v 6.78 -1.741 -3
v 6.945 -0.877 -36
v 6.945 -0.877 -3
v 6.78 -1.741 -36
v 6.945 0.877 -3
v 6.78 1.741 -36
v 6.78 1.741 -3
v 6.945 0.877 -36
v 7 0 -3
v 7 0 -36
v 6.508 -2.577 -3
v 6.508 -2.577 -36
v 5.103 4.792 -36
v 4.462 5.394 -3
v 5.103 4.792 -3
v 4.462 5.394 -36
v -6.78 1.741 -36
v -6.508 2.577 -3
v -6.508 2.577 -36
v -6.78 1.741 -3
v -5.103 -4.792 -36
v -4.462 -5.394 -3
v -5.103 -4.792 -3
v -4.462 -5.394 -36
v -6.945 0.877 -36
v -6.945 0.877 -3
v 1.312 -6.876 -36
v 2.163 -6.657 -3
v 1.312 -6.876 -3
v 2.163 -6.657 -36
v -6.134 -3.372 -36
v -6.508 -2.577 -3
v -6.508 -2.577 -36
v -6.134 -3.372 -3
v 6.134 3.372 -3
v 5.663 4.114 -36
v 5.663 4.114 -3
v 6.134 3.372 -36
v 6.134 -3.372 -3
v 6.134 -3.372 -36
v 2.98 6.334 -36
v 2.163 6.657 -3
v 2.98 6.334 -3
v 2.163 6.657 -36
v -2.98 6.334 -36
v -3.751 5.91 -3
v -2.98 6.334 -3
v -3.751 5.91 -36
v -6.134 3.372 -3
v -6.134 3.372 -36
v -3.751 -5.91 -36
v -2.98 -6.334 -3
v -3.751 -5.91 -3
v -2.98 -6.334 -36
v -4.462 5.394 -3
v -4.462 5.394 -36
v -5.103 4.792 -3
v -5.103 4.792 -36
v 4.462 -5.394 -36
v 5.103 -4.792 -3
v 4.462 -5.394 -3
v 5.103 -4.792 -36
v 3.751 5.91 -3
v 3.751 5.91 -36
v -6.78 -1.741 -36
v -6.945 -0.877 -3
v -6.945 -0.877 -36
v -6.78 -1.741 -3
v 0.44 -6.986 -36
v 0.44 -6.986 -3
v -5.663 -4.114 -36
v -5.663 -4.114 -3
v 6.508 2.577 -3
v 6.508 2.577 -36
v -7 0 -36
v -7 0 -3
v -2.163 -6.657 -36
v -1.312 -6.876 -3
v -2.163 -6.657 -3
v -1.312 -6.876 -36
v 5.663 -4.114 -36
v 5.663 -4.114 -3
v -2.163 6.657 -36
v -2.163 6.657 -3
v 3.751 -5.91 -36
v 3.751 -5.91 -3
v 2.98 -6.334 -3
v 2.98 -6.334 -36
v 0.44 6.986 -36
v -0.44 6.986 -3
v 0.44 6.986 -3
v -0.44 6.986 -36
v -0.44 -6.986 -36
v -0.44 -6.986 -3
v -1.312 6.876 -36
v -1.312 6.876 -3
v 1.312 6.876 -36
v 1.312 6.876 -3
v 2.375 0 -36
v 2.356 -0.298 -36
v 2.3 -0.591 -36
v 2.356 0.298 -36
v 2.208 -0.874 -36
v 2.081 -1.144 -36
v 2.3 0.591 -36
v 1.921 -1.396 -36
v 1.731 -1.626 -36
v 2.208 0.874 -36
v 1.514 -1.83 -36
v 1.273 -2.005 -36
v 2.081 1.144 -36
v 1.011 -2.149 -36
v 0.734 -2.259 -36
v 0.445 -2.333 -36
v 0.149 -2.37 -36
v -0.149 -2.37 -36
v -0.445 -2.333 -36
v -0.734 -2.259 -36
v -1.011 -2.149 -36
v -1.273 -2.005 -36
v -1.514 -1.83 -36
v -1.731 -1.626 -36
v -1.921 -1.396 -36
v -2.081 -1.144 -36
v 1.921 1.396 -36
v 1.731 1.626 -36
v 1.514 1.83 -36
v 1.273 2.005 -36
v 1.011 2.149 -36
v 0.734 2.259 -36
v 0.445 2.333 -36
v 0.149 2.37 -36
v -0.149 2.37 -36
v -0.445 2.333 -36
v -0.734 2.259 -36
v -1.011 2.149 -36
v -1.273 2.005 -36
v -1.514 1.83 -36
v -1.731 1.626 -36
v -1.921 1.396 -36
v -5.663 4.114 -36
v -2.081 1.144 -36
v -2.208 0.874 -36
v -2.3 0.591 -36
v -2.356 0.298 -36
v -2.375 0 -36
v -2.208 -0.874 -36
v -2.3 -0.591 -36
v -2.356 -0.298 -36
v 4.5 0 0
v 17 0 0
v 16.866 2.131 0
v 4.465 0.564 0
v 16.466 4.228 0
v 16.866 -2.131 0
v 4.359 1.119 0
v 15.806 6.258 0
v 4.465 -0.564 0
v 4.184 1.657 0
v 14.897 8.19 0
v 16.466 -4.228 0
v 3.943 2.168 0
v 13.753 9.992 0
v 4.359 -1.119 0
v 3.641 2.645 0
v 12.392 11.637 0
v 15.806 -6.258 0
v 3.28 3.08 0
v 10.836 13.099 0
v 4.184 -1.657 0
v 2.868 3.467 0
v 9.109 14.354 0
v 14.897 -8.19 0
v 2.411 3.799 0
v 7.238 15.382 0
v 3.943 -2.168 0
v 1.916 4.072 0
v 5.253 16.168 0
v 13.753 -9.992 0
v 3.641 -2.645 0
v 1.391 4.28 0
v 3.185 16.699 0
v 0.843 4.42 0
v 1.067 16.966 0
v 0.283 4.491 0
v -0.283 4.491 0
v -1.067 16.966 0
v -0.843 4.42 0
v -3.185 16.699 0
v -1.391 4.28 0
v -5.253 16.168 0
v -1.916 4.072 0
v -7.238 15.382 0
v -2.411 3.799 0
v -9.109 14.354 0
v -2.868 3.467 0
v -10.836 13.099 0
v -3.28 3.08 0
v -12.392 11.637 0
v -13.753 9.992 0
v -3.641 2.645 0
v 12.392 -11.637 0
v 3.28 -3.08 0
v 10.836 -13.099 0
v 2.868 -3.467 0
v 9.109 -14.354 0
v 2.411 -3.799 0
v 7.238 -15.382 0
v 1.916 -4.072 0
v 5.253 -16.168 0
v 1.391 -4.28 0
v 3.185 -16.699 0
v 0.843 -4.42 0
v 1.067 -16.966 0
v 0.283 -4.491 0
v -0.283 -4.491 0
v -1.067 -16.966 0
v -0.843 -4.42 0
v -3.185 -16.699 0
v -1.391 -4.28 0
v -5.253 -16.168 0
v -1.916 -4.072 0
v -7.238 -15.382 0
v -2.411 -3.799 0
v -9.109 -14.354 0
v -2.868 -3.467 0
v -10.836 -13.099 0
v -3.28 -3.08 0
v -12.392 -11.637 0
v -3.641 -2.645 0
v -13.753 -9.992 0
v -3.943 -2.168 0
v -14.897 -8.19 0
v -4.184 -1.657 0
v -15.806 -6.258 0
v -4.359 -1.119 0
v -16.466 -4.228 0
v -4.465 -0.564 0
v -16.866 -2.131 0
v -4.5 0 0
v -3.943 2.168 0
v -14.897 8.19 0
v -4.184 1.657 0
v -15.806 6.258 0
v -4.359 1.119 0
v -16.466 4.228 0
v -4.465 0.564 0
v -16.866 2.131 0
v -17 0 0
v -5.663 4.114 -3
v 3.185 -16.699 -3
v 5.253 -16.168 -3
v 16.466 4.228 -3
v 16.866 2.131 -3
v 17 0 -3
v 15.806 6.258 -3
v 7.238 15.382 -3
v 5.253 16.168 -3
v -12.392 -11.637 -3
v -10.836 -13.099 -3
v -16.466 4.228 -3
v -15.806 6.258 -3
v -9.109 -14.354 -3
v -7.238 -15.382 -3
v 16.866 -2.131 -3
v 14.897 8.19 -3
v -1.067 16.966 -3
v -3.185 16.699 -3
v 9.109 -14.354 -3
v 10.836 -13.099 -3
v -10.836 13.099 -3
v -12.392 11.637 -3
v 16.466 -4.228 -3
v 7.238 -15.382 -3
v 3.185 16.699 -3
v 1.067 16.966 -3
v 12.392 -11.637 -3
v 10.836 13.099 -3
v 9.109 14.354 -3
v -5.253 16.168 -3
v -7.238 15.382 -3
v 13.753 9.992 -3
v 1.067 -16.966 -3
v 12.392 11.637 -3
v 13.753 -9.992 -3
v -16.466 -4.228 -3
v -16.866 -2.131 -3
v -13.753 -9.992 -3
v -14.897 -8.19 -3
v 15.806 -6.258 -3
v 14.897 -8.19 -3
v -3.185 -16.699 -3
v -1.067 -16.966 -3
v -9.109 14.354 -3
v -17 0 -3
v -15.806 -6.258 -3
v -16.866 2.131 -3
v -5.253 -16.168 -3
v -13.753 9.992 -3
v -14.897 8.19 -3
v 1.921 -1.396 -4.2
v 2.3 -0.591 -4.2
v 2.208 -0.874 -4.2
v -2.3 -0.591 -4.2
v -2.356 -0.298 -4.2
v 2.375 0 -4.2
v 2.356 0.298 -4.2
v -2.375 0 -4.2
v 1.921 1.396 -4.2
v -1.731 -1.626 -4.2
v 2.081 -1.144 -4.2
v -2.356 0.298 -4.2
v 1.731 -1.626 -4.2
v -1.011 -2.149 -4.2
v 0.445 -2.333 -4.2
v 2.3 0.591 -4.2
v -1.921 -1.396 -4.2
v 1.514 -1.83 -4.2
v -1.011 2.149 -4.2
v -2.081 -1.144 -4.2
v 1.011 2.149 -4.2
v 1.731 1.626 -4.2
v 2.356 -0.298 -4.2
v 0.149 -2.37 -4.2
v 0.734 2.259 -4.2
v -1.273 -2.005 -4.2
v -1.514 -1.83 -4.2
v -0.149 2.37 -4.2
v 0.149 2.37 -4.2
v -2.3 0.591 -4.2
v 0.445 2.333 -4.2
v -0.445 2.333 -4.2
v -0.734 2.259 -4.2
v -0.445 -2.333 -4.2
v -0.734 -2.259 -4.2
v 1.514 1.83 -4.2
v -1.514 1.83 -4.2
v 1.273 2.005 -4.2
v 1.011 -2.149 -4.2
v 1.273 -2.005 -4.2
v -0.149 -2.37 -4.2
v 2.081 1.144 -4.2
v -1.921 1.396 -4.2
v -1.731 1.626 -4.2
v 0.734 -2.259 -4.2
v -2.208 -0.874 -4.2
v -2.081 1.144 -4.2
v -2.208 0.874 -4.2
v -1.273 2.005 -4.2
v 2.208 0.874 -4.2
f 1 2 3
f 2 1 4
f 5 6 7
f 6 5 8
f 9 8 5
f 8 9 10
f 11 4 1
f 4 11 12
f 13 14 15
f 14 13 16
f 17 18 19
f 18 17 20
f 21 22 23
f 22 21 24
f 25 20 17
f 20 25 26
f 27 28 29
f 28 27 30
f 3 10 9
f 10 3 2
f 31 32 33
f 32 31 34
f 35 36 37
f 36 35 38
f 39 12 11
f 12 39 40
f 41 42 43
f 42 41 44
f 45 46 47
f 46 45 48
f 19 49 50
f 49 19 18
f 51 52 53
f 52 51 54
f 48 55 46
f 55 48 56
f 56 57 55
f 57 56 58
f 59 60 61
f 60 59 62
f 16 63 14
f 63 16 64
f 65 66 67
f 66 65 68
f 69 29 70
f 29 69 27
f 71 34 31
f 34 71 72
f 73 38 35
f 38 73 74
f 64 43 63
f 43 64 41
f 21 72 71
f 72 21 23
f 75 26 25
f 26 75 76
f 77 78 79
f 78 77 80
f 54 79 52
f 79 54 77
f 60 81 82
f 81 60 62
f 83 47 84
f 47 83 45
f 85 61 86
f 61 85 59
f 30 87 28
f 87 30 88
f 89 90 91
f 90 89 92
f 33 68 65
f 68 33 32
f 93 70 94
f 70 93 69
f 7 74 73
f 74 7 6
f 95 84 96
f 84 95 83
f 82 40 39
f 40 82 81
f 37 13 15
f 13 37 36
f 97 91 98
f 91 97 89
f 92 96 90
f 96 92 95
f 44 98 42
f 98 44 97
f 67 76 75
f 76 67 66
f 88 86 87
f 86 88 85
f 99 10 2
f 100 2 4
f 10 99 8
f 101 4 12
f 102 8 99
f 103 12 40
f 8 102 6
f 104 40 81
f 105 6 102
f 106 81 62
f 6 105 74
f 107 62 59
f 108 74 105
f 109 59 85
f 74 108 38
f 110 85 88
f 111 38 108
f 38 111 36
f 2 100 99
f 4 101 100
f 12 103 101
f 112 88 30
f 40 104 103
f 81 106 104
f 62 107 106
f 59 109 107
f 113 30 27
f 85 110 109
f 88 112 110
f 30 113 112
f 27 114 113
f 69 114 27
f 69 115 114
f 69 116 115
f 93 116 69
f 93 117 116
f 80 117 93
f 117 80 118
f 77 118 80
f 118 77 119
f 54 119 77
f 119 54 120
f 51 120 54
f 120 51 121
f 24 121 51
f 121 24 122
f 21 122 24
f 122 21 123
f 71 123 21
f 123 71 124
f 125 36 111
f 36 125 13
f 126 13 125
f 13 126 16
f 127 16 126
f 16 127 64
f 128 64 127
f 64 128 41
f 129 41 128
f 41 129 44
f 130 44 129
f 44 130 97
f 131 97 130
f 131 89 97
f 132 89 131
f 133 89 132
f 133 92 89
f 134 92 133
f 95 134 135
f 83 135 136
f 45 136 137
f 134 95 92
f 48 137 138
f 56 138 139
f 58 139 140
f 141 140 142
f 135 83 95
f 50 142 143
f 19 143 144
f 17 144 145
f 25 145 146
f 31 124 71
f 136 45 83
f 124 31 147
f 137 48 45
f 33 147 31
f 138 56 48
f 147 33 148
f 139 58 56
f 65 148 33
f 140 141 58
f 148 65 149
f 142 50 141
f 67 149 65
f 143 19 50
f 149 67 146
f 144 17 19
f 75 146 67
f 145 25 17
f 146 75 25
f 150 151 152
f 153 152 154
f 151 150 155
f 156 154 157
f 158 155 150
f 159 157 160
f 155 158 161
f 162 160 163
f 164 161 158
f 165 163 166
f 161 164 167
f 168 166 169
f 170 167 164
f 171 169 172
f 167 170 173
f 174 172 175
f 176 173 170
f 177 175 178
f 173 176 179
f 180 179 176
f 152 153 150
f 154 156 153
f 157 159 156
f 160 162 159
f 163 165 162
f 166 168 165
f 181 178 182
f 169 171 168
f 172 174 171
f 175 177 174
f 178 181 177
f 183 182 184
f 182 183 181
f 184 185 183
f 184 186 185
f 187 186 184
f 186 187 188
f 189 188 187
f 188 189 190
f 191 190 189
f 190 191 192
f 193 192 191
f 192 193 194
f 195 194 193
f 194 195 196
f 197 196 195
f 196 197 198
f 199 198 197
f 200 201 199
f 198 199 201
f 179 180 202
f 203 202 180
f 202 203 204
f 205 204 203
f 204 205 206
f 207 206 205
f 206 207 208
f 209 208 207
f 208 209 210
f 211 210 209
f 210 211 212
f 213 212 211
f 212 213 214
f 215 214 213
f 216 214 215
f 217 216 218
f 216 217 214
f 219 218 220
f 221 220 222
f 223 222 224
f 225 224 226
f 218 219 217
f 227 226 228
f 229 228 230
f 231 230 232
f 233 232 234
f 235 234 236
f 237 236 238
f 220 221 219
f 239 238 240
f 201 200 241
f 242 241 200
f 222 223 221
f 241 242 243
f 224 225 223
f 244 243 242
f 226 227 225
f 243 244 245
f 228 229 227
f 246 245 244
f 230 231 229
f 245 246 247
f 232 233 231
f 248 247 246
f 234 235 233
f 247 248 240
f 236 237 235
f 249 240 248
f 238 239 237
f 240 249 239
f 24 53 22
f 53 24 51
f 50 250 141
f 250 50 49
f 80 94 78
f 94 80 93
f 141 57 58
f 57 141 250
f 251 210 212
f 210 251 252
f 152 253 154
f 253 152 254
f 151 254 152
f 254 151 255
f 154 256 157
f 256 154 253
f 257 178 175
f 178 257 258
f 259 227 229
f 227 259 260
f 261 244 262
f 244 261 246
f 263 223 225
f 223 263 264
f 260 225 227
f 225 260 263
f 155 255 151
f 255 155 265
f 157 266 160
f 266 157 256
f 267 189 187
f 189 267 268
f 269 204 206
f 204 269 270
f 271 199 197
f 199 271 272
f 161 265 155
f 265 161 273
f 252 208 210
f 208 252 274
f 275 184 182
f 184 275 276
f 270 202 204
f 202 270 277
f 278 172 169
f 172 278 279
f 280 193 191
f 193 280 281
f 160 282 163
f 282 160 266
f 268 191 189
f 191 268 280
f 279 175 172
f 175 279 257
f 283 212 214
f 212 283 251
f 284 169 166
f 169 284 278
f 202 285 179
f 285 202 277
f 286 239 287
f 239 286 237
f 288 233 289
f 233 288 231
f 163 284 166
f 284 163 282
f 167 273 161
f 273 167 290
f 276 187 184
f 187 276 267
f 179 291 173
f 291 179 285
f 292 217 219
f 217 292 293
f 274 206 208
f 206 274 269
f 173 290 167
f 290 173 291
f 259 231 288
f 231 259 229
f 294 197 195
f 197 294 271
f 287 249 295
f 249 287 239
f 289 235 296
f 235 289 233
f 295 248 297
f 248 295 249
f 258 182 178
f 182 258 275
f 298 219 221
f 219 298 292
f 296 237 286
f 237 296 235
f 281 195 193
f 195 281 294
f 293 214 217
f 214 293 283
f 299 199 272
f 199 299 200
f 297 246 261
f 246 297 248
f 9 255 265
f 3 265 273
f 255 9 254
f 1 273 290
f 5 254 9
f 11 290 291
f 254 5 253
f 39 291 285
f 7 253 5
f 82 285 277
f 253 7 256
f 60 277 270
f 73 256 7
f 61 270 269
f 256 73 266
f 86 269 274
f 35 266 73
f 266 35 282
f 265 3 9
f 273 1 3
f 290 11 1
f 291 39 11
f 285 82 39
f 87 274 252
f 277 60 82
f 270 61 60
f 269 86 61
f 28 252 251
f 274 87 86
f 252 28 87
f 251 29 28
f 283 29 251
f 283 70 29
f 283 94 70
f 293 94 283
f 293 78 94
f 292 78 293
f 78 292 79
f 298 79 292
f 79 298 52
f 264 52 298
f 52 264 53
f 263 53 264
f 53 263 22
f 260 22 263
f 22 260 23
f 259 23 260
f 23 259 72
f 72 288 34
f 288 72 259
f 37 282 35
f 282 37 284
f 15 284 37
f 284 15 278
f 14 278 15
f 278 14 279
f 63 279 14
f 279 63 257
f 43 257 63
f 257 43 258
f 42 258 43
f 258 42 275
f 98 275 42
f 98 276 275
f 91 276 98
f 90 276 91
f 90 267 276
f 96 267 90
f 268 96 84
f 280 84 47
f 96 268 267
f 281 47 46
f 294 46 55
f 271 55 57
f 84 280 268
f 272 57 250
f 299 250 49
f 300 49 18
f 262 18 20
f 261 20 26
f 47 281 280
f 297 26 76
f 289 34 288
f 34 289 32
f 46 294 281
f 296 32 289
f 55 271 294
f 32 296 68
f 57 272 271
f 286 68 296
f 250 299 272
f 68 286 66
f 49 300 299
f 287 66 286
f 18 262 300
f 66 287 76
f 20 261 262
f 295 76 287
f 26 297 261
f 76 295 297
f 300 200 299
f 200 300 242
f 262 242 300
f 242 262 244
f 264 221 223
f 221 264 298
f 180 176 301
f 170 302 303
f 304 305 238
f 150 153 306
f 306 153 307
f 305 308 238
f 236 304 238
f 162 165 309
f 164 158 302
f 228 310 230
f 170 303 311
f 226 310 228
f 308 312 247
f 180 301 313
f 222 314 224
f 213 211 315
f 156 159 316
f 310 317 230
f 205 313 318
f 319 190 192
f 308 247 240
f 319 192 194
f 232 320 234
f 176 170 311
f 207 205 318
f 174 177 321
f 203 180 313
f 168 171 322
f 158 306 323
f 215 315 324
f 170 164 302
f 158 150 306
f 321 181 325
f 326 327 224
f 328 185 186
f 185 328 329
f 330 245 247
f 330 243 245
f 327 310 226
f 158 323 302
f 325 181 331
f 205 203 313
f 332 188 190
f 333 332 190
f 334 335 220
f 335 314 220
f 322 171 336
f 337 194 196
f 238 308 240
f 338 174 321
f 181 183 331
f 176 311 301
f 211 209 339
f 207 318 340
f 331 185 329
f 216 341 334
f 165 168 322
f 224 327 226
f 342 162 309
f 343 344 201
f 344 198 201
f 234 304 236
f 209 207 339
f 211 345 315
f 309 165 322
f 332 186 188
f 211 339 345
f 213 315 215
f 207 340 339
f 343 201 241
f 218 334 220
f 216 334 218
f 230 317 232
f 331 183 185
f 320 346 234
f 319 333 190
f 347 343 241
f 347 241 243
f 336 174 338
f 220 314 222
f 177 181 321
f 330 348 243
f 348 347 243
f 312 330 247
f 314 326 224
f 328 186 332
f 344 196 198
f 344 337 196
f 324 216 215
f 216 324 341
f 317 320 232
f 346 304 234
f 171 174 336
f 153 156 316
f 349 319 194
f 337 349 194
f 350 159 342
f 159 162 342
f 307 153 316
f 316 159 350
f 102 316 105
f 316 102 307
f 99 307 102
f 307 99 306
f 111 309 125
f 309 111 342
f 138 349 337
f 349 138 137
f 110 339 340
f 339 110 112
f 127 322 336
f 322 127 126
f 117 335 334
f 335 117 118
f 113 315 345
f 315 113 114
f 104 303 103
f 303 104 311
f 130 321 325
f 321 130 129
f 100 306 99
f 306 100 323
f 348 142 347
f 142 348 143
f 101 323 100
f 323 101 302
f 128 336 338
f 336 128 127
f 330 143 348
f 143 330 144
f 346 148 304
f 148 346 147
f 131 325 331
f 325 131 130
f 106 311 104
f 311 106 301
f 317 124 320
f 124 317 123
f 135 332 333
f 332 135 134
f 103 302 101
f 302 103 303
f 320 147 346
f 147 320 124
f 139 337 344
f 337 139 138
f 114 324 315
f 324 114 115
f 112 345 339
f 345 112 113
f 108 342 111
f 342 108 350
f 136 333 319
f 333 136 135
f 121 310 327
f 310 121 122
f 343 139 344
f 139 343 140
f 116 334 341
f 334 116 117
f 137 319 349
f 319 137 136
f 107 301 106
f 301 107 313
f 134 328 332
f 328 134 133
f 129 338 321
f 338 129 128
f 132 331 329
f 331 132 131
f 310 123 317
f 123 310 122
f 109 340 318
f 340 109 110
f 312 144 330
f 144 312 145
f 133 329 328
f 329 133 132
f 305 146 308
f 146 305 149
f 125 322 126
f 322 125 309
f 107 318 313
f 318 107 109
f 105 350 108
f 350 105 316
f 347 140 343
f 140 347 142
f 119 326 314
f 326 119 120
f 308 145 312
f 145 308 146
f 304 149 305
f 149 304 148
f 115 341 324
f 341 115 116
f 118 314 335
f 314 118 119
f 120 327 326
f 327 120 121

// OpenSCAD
$fn = 50;


difference() {
	union() {
		translate(v = [0, 0, -36.0000000000]) {
			cylinder(h = 36, r = 7.0000000000);
		}
		translate(v = [0, 0, -3.0000000000]) {
			cylinder(h = 3, r = 17.0000000000);
		}
	}
	union() {
		translate(v = [0, 0, 0]) {
			rotate(a = [0, 0, 0]) {
				difference() {
					union() {
						#translate(v = [0, 0, -36.0000000000]) {
							cylinder(h = 36, r = 2.2500000000);
						}
						#translate(v = [0, 0, -4.2000000000]) {
							cylinder(h = 4.2000000000, r1 = 2.3750000000, r2 = 4.5000000000);
						}
						#translate(v = [0, 0, -36.0000000000]) {
							cylinder(h = 36, r = 2.3750000000);
						}
						#translate(v = [0, 0, -36.0000000000]) {
							cylinder(h = 36, r = 2.2500000000);
						}
					}
					union();
				}
			}
		}
	}
}
